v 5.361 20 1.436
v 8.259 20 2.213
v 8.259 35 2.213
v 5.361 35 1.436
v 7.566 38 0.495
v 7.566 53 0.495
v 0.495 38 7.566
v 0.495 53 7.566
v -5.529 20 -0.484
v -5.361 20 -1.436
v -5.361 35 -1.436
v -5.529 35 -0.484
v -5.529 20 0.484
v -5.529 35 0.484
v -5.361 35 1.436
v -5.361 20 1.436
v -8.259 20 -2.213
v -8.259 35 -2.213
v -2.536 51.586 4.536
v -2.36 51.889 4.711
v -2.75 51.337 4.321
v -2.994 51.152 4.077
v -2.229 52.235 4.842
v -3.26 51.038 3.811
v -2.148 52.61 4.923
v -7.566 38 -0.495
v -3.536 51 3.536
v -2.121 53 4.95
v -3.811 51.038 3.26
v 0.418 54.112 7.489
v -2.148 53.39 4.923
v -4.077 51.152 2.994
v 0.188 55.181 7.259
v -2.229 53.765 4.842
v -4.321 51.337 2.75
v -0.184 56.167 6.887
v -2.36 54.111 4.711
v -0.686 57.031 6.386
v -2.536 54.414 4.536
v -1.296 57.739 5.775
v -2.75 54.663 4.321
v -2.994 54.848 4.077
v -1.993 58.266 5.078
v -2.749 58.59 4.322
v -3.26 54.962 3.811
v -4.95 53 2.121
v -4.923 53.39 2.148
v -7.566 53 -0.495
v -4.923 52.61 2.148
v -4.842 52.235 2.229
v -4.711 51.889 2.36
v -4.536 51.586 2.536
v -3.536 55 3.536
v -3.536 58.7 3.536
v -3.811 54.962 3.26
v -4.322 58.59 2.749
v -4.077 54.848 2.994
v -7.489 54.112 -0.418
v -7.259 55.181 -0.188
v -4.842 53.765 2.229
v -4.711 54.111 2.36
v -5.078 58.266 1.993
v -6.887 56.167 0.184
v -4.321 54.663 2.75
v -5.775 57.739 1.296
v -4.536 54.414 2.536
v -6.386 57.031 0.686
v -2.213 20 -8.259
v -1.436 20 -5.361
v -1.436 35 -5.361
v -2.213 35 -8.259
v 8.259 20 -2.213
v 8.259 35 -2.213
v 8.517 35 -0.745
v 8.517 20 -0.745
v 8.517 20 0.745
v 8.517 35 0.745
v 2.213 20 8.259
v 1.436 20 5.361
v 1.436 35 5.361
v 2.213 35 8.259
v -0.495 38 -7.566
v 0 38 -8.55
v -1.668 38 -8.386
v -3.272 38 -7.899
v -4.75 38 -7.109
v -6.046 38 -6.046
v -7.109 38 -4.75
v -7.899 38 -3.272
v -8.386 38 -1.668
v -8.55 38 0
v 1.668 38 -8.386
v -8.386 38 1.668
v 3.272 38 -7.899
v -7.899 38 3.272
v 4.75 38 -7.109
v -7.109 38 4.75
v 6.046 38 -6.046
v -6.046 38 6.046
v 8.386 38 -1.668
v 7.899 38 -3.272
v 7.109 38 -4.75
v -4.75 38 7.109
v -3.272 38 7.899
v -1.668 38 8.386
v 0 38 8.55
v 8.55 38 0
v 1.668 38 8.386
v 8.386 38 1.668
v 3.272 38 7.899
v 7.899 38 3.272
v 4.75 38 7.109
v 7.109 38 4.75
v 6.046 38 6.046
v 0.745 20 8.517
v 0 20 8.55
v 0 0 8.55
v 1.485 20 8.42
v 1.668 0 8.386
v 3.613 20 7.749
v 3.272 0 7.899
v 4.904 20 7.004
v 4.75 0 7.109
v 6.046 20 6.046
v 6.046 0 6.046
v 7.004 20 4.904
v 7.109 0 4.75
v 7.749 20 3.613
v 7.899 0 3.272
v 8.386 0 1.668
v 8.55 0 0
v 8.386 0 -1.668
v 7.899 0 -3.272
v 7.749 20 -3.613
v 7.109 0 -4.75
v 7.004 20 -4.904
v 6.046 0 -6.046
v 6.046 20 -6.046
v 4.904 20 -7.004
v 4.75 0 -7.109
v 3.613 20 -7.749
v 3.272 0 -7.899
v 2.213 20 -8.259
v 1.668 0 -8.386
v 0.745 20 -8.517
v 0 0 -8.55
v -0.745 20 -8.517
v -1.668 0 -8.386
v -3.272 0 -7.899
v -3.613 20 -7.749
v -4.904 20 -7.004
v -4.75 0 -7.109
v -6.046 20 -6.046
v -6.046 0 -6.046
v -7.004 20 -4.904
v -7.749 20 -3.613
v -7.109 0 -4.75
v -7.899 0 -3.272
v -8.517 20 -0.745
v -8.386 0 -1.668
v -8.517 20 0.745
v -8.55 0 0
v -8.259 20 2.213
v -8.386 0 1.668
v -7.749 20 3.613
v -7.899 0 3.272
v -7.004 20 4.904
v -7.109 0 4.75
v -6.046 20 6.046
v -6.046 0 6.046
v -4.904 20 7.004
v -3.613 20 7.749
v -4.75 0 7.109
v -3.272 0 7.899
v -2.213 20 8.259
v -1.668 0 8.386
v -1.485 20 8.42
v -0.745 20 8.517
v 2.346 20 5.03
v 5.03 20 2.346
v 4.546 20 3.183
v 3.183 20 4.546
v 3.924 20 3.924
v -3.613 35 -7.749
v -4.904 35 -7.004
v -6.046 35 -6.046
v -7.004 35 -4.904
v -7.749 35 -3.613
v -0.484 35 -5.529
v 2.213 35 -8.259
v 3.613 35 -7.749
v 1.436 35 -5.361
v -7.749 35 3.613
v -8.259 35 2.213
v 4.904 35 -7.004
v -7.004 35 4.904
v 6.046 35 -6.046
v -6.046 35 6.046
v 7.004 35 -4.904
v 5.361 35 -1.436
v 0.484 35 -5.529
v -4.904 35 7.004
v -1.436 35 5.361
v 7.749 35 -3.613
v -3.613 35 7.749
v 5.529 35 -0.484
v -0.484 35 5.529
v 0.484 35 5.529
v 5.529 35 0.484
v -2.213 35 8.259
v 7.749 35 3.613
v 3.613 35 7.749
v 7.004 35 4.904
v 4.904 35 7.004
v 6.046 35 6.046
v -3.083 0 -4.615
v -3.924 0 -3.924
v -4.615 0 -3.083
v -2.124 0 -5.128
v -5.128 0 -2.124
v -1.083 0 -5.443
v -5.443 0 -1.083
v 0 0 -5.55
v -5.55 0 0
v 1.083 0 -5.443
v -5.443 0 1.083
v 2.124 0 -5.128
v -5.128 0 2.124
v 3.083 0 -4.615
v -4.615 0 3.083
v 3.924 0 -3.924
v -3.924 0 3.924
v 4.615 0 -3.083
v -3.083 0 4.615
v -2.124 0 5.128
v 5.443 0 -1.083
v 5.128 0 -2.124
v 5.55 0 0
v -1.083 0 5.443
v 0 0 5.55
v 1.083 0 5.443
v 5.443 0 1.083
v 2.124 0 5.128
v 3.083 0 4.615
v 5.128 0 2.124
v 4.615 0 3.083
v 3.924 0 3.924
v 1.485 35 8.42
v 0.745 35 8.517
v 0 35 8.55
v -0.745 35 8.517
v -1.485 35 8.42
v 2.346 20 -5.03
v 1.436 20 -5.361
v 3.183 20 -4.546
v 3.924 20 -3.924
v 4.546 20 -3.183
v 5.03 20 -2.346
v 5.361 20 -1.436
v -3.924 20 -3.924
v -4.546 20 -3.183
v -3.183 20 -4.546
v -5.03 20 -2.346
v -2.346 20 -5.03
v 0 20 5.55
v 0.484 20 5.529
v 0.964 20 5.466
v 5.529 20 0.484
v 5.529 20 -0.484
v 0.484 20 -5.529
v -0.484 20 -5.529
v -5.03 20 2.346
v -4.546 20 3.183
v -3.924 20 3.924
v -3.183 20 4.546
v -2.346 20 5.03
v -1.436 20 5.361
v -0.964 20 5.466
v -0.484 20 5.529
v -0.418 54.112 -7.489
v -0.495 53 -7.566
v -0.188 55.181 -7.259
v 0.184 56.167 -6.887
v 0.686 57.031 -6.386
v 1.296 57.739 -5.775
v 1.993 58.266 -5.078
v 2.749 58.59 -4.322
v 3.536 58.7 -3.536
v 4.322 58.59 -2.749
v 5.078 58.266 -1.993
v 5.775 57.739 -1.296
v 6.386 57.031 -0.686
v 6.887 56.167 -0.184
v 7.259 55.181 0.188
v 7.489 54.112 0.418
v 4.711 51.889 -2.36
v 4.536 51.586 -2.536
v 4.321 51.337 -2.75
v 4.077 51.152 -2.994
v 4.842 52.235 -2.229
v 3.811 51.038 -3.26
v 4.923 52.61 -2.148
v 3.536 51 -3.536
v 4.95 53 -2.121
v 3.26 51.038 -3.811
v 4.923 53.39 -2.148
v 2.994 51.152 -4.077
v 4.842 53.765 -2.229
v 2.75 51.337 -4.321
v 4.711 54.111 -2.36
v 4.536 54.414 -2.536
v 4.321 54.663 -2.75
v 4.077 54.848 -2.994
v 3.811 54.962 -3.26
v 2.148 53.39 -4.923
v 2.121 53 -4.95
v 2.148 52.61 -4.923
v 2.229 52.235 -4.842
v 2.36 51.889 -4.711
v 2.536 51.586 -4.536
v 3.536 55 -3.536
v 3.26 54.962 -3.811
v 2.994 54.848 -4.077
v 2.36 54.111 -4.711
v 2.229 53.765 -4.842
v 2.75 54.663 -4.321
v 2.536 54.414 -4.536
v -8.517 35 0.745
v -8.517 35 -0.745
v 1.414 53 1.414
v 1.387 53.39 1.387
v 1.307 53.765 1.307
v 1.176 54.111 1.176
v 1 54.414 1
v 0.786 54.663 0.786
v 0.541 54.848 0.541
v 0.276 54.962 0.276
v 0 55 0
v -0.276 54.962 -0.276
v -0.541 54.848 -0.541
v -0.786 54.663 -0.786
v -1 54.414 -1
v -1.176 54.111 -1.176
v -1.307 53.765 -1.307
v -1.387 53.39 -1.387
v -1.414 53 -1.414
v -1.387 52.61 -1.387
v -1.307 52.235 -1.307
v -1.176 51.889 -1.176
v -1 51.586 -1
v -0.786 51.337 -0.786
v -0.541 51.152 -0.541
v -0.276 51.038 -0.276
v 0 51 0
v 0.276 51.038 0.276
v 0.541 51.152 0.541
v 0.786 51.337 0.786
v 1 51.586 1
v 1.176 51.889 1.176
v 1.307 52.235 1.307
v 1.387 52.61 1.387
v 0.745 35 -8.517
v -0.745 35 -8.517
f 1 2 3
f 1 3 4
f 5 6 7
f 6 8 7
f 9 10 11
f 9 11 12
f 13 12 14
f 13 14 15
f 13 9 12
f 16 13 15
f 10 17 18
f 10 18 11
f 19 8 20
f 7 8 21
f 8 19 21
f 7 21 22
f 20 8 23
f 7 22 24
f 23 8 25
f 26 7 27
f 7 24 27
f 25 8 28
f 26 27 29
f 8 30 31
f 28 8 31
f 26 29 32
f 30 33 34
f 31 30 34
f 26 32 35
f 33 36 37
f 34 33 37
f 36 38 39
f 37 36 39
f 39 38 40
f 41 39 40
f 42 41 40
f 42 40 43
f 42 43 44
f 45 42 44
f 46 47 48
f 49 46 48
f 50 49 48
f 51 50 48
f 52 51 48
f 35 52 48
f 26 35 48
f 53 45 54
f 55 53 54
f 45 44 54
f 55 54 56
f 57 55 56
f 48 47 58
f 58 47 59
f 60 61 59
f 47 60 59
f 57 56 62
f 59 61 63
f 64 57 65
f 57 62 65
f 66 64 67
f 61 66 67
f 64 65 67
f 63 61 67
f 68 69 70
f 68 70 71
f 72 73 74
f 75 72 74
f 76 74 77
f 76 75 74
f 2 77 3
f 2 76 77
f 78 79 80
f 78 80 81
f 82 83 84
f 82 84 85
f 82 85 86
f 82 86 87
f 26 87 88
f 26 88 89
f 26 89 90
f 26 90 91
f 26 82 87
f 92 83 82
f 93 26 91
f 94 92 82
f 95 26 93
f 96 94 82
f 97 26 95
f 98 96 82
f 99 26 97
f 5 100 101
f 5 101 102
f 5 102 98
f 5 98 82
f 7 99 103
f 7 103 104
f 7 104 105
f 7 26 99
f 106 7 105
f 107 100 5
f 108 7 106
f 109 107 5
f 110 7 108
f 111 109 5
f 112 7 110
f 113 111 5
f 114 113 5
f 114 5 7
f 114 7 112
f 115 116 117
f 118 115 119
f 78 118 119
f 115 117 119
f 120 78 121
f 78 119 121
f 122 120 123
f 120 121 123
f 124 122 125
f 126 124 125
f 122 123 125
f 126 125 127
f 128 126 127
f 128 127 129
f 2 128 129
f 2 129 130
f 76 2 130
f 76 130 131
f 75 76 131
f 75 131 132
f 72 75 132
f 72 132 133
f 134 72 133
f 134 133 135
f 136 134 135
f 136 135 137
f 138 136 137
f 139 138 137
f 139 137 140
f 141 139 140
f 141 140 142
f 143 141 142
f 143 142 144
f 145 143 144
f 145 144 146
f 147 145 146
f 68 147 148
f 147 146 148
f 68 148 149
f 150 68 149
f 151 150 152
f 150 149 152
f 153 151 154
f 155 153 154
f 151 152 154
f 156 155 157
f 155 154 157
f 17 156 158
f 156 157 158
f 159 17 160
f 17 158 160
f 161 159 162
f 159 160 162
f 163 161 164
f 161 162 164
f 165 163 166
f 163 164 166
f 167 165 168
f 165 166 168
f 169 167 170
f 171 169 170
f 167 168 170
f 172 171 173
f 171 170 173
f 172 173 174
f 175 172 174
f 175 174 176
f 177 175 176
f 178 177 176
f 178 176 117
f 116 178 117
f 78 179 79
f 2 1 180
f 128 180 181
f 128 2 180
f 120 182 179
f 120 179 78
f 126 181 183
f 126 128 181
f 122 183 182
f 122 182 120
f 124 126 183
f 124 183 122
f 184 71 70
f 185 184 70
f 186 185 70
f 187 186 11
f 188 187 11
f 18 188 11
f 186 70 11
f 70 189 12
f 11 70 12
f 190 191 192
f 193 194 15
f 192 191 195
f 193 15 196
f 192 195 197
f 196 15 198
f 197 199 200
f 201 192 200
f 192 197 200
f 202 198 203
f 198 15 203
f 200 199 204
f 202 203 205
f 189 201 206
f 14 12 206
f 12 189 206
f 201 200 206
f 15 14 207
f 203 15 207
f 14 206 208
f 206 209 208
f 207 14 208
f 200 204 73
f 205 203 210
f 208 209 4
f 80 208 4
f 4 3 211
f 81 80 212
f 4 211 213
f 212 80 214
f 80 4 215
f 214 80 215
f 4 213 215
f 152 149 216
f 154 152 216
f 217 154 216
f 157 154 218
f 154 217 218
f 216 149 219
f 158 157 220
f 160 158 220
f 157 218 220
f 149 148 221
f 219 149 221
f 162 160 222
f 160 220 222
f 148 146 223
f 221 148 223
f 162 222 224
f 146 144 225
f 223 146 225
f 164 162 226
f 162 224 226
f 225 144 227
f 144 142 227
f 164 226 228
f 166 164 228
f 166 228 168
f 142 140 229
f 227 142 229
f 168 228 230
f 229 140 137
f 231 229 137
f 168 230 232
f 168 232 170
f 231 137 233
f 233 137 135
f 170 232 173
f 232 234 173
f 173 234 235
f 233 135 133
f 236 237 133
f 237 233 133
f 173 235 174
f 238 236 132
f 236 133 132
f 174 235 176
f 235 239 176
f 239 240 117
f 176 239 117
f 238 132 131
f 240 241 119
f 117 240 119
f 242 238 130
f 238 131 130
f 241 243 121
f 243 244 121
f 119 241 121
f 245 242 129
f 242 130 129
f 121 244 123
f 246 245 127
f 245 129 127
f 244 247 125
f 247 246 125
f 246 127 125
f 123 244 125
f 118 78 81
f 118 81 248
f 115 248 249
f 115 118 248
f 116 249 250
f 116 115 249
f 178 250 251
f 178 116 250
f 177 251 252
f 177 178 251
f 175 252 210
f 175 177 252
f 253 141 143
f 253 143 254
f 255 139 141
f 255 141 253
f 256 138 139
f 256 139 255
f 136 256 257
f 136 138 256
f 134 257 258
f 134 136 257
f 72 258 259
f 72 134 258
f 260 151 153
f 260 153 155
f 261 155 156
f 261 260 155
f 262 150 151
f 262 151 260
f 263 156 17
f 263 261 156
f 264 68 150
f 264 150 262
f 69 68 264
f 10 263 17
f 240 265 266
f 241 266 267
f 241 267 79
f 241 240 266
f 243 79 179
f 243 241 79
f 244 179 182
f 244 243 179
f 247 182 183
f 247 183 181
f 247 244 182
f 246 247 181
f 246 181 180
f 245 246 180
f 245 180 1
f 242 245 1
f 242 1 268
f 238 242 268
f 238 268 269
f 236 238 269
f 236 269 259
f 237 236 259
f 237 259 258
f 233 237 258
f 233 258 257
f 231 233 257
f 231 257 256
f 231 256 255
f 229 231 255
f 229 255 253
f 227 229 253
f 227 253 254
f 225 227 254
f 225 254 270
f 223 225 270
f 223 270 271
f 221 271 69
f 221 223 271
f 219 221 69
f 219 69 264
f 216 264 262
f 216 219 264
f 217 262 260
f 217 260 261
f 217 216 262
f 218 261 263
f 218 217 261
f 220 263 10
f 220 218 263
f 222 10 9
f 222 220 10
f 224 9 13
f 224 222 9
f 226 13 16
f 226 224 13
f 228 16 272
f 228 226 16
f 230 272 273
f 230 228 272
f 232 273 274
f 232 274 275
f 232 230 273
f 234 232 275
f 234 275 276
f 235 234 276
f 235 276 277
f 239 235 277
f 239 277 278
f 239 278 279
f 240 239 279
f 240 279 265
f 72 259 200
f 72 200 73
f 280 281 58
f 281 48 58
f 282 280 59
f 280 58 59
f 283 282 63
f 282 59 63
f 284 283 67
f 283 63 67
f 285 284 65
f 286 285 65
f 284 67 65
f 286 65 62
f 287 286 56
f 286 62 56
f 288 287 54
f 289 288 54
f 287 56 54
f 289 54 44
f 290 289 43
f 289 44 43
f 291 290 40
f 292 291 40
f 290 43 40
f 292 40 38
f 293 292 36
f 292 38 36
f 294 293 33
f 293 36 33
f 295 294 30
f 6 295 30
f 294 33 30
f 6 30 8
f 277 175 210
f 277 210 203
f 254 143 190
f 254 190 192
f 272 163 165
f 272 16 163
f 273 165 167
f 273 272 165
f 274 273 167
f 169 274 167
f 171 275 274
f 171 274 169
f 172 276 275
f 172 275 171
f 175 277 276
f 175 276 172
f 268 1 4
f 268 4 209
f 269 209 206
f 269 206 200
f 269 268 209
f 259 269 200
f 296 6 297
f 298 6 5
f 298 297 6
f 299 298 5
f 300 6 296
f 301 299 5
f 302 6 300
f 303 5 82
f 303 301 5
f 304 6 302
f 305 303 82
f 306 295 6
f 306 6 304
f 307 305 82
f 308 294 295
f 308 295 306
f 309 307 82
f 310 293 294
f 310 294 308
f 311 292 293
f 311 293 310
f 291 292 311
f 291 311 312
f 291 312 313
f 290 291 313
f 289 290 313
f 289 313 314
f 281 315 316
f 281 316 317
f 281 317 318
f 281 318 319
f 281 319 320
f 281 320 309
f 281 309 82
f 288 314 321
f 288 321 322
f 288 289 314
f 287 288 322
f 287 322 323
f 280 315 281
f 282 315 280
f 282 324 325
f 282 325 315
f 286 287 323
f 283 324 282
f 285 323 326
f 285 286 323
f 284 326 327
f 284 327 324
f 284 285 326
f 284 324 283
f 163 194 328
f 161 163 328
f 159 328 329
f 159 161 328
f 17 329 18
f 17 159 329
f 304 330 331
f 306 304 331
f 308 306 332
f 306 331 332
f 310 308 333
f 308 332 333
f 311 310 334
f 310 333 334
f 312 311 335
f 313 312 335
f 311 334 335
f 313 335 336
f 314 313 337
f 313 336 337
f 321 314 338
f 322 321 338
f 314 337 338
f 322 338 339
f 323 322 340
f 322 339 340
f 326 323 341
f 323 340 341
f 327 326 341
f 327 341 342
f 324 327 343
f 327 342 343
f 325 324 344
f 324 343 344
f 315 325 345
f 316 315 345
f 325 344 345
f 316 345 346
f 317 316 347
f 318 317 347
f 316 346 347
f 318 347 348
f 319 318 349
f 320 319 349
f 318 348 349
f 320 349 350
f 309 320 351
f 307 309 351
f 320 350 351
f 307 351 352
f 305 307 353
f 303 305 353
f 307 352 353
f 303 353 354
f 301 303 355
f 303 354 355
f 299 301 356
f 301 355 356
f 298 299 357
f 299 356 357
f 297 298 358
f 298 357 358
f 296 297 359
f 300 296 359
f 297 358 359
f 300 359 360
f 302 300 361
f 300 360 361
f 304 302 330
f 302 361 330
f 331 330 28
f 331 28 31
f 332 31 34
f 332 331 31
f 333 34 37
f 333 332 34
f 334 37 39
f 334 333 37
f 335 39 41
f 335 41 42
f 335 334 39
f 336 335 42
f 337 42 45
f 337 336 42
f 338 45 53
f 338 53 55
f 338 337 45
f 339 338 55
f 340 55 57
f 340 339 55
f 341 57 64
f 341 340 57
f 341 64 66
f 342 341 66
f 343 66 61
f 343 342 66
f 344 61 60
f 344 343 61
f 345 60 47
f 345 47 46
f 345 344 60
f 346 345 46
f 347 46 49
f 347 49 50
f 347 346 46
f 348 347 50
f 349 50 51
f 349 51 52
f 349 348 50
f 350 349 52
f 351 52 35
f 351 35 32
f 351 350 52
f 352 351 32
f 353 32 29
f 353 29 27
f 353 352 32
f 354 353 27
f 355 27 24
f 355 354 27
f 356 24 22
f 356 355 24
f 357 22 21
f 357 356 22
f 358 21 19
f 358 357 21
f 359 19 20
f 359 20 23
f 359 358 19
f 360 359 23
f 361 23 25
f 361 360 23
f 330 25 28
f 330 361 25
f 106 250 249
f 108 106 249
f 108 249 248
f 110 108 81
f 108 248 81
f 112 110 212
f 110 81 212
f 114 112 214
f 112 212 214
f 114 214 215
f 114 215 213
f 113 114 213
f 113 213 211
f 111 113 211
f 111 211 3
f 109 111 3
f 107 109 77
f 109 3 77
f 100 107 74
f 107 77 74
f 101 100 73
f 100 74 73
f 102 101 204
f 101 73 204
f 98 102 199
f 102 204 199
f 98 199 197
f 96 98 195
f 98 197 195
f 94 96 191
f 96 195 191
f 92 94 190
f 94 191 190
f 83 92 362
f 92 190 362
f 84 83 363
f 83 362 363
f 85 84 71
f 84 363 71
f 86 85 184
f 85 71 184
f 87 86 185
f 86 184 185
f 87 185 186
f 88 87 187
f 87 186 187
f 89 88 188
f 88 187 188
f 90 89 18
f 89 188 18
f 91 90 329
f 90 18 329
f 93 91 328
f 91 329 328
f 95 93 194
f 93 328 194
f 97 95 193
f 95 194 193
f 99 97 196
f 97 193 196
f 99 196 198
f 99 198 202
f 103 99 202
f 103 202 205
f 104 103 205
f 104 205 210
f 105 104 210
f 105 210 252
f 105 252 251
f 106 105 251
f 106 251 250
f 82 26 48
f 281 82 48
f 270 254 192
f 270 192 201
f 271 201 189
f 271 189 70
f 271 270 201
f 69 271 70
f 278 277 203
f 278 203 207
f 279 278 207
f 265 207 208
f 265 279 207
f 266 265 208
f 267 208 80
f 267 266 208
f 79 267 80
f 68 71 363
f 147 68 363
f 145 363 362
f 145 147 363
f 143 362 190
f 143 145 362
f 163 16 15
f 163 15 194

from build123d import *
from build123d.topology import SkipClean

# Parameters (mm, degrees)
SKETCH_4_R      = 8.55
SKETCH_4_R_2    = 5.55
EXTRUDE_1_DEPTH = 20
EXTRUDE_2_DEPTH = 15
SKETCH_6_R      = 8.55
EXTRUDE_3_DEPTH = 3
SKETCH_9_R      = 2
EXTRUDE_4_DEPTH = 5


with BuildPart() as part:
    # Эскиз4 → Бобышка-Вытянуть1 (new body)
    with BuildSketch(Plane(origin=(0, 0, 0), x_dir=(1, 0, 0), z_dir=(0, 1, 0))):
        with Locations(Location((0, 0, 0), (0, 0, 270))):
            Circle(SKETCH_4_R)
        with Locations(Location((0, 0, 0), (0, 0, 270))):
            Circle(SKETCH_4_R_2, mode=Mode.SUBTRACT)
    extrude(amount=EXTRUDE_1_DEPTH)

    # Эскиз5 → Бобышка-Вытянуть2 (add)
    with SkipClean():  # the faces are left unmerged after this step: merging them gives an invalid solid
        with BuildSketch(Plane(origin=(0, 20, 0), x_dir=(1, 0, 0), z_dir=(0, 1, 0))):
            with BuildLine():
                Line((2.212902836, 8.258665815), (1.4364457, 5.360888336))
                ThreePointArc((1.4364457, 5.360888336), (0, 5.55), (-1.4364457, 5.360888336))
                Line((-1.4364457, 5.360888336), (-2.212902836, 8.258665815))
                ThreePointArc((-2.212902836, 8.258665815), (0, 8.55), (2.212902836, 8.258665815))
            make_face()
            with BuildLine():
                Line((8.258665815, -2.212902836), (5.360888336, -1.4364457))
                ThreePointArc((5.360888336, -1.4364457), (5.55, 0), (5.360888336, 1.4364457))
                Line((5.360888336, 1.4364457), (8.258665815, 2.212902836))
                ThreePointArc((8.258665815, 2.212902836), (8.55, 0), (8.258665815, -2.212902836))
            make_face()
            with BuildLine():
                Line((-2.212902836, -8.258665815), (-1.4364457, -5.360888336))
                ThreePointArc((-1.4364457, -5.360888336), (0, -5.55), (1.4364457, -5.360888336))
                Line((1.4364457, -5.360888336), (2.212902836, -8.258665815))
                ThreePointArc((2.212902836, -8.258665815), (0, -8.55), (-2.212902836, -8.258665815))
            make_face()
            with BuildLine():
                Line((-8.258665815, 2.212902836), (-5.360888336, 1.4364457))
                ThreePointArc((-5.360888336, 1.4364457), (-5.55, 0), (-5.360888336, -1.4364457))
                Line((-5.360888336, -1.4364457), (-8.258665815, -2.212902836))
                ThreePointArc((-8.258665815, -2.212902836), (-8.55, 0), (-8.258665815, 2.212902836))
            make_face()
        extrude(amount=EXTRUDE_2_DEPTH)

    # Эскиз6 → Бобышка-Вытянуть3 (add)
    with SkipClean():  # the faces are left unmerged after this step: merging them gives an invalid solid
        with BuildSketch(Plane(origin=(0, 35, 0), x_dir=(1, 0, 0), z_dir=(0, 1, 0))):
            with Locations(Location((0, 0, 0), (0, 0, 270))):
                Circle(SKETCH_6_R)
        extrude(amount=EXTRUDE_3_DEPTH)

    # Эскиз9 → Бобышка-Вытянуть4 (add, symmetric)
    with SkipClean():  # the faces are left unmerged after this step: merging them gives an invalid solid
        with BuildSketch(Plane(origin=(0, 0, 0), x_dir=(0.7071067811865477, 0, 0.7071067811865475), z_dir=(-0.7071067811865475, 0, 0.7071067811865477))):
            with BuildLine():
                Line((-5.7, 38), (-5.7, 53))
                ThreePointArc((-5.7, 53), (0, 58.7), (5.7, 53))
                Line((5.7, 53), (5.7, 38))
                Line((5.7, 38), (0, 38))
                Line((0, 38), (-5.7, 38))
            make_face()
            with Locations((0, 53)):
                Circle(SKETCH_9_R, mode=Mode.SUBTRACT)
        extrude(amount=EXTRUDE_4_DEPTH, both=True)


solid = part.part
